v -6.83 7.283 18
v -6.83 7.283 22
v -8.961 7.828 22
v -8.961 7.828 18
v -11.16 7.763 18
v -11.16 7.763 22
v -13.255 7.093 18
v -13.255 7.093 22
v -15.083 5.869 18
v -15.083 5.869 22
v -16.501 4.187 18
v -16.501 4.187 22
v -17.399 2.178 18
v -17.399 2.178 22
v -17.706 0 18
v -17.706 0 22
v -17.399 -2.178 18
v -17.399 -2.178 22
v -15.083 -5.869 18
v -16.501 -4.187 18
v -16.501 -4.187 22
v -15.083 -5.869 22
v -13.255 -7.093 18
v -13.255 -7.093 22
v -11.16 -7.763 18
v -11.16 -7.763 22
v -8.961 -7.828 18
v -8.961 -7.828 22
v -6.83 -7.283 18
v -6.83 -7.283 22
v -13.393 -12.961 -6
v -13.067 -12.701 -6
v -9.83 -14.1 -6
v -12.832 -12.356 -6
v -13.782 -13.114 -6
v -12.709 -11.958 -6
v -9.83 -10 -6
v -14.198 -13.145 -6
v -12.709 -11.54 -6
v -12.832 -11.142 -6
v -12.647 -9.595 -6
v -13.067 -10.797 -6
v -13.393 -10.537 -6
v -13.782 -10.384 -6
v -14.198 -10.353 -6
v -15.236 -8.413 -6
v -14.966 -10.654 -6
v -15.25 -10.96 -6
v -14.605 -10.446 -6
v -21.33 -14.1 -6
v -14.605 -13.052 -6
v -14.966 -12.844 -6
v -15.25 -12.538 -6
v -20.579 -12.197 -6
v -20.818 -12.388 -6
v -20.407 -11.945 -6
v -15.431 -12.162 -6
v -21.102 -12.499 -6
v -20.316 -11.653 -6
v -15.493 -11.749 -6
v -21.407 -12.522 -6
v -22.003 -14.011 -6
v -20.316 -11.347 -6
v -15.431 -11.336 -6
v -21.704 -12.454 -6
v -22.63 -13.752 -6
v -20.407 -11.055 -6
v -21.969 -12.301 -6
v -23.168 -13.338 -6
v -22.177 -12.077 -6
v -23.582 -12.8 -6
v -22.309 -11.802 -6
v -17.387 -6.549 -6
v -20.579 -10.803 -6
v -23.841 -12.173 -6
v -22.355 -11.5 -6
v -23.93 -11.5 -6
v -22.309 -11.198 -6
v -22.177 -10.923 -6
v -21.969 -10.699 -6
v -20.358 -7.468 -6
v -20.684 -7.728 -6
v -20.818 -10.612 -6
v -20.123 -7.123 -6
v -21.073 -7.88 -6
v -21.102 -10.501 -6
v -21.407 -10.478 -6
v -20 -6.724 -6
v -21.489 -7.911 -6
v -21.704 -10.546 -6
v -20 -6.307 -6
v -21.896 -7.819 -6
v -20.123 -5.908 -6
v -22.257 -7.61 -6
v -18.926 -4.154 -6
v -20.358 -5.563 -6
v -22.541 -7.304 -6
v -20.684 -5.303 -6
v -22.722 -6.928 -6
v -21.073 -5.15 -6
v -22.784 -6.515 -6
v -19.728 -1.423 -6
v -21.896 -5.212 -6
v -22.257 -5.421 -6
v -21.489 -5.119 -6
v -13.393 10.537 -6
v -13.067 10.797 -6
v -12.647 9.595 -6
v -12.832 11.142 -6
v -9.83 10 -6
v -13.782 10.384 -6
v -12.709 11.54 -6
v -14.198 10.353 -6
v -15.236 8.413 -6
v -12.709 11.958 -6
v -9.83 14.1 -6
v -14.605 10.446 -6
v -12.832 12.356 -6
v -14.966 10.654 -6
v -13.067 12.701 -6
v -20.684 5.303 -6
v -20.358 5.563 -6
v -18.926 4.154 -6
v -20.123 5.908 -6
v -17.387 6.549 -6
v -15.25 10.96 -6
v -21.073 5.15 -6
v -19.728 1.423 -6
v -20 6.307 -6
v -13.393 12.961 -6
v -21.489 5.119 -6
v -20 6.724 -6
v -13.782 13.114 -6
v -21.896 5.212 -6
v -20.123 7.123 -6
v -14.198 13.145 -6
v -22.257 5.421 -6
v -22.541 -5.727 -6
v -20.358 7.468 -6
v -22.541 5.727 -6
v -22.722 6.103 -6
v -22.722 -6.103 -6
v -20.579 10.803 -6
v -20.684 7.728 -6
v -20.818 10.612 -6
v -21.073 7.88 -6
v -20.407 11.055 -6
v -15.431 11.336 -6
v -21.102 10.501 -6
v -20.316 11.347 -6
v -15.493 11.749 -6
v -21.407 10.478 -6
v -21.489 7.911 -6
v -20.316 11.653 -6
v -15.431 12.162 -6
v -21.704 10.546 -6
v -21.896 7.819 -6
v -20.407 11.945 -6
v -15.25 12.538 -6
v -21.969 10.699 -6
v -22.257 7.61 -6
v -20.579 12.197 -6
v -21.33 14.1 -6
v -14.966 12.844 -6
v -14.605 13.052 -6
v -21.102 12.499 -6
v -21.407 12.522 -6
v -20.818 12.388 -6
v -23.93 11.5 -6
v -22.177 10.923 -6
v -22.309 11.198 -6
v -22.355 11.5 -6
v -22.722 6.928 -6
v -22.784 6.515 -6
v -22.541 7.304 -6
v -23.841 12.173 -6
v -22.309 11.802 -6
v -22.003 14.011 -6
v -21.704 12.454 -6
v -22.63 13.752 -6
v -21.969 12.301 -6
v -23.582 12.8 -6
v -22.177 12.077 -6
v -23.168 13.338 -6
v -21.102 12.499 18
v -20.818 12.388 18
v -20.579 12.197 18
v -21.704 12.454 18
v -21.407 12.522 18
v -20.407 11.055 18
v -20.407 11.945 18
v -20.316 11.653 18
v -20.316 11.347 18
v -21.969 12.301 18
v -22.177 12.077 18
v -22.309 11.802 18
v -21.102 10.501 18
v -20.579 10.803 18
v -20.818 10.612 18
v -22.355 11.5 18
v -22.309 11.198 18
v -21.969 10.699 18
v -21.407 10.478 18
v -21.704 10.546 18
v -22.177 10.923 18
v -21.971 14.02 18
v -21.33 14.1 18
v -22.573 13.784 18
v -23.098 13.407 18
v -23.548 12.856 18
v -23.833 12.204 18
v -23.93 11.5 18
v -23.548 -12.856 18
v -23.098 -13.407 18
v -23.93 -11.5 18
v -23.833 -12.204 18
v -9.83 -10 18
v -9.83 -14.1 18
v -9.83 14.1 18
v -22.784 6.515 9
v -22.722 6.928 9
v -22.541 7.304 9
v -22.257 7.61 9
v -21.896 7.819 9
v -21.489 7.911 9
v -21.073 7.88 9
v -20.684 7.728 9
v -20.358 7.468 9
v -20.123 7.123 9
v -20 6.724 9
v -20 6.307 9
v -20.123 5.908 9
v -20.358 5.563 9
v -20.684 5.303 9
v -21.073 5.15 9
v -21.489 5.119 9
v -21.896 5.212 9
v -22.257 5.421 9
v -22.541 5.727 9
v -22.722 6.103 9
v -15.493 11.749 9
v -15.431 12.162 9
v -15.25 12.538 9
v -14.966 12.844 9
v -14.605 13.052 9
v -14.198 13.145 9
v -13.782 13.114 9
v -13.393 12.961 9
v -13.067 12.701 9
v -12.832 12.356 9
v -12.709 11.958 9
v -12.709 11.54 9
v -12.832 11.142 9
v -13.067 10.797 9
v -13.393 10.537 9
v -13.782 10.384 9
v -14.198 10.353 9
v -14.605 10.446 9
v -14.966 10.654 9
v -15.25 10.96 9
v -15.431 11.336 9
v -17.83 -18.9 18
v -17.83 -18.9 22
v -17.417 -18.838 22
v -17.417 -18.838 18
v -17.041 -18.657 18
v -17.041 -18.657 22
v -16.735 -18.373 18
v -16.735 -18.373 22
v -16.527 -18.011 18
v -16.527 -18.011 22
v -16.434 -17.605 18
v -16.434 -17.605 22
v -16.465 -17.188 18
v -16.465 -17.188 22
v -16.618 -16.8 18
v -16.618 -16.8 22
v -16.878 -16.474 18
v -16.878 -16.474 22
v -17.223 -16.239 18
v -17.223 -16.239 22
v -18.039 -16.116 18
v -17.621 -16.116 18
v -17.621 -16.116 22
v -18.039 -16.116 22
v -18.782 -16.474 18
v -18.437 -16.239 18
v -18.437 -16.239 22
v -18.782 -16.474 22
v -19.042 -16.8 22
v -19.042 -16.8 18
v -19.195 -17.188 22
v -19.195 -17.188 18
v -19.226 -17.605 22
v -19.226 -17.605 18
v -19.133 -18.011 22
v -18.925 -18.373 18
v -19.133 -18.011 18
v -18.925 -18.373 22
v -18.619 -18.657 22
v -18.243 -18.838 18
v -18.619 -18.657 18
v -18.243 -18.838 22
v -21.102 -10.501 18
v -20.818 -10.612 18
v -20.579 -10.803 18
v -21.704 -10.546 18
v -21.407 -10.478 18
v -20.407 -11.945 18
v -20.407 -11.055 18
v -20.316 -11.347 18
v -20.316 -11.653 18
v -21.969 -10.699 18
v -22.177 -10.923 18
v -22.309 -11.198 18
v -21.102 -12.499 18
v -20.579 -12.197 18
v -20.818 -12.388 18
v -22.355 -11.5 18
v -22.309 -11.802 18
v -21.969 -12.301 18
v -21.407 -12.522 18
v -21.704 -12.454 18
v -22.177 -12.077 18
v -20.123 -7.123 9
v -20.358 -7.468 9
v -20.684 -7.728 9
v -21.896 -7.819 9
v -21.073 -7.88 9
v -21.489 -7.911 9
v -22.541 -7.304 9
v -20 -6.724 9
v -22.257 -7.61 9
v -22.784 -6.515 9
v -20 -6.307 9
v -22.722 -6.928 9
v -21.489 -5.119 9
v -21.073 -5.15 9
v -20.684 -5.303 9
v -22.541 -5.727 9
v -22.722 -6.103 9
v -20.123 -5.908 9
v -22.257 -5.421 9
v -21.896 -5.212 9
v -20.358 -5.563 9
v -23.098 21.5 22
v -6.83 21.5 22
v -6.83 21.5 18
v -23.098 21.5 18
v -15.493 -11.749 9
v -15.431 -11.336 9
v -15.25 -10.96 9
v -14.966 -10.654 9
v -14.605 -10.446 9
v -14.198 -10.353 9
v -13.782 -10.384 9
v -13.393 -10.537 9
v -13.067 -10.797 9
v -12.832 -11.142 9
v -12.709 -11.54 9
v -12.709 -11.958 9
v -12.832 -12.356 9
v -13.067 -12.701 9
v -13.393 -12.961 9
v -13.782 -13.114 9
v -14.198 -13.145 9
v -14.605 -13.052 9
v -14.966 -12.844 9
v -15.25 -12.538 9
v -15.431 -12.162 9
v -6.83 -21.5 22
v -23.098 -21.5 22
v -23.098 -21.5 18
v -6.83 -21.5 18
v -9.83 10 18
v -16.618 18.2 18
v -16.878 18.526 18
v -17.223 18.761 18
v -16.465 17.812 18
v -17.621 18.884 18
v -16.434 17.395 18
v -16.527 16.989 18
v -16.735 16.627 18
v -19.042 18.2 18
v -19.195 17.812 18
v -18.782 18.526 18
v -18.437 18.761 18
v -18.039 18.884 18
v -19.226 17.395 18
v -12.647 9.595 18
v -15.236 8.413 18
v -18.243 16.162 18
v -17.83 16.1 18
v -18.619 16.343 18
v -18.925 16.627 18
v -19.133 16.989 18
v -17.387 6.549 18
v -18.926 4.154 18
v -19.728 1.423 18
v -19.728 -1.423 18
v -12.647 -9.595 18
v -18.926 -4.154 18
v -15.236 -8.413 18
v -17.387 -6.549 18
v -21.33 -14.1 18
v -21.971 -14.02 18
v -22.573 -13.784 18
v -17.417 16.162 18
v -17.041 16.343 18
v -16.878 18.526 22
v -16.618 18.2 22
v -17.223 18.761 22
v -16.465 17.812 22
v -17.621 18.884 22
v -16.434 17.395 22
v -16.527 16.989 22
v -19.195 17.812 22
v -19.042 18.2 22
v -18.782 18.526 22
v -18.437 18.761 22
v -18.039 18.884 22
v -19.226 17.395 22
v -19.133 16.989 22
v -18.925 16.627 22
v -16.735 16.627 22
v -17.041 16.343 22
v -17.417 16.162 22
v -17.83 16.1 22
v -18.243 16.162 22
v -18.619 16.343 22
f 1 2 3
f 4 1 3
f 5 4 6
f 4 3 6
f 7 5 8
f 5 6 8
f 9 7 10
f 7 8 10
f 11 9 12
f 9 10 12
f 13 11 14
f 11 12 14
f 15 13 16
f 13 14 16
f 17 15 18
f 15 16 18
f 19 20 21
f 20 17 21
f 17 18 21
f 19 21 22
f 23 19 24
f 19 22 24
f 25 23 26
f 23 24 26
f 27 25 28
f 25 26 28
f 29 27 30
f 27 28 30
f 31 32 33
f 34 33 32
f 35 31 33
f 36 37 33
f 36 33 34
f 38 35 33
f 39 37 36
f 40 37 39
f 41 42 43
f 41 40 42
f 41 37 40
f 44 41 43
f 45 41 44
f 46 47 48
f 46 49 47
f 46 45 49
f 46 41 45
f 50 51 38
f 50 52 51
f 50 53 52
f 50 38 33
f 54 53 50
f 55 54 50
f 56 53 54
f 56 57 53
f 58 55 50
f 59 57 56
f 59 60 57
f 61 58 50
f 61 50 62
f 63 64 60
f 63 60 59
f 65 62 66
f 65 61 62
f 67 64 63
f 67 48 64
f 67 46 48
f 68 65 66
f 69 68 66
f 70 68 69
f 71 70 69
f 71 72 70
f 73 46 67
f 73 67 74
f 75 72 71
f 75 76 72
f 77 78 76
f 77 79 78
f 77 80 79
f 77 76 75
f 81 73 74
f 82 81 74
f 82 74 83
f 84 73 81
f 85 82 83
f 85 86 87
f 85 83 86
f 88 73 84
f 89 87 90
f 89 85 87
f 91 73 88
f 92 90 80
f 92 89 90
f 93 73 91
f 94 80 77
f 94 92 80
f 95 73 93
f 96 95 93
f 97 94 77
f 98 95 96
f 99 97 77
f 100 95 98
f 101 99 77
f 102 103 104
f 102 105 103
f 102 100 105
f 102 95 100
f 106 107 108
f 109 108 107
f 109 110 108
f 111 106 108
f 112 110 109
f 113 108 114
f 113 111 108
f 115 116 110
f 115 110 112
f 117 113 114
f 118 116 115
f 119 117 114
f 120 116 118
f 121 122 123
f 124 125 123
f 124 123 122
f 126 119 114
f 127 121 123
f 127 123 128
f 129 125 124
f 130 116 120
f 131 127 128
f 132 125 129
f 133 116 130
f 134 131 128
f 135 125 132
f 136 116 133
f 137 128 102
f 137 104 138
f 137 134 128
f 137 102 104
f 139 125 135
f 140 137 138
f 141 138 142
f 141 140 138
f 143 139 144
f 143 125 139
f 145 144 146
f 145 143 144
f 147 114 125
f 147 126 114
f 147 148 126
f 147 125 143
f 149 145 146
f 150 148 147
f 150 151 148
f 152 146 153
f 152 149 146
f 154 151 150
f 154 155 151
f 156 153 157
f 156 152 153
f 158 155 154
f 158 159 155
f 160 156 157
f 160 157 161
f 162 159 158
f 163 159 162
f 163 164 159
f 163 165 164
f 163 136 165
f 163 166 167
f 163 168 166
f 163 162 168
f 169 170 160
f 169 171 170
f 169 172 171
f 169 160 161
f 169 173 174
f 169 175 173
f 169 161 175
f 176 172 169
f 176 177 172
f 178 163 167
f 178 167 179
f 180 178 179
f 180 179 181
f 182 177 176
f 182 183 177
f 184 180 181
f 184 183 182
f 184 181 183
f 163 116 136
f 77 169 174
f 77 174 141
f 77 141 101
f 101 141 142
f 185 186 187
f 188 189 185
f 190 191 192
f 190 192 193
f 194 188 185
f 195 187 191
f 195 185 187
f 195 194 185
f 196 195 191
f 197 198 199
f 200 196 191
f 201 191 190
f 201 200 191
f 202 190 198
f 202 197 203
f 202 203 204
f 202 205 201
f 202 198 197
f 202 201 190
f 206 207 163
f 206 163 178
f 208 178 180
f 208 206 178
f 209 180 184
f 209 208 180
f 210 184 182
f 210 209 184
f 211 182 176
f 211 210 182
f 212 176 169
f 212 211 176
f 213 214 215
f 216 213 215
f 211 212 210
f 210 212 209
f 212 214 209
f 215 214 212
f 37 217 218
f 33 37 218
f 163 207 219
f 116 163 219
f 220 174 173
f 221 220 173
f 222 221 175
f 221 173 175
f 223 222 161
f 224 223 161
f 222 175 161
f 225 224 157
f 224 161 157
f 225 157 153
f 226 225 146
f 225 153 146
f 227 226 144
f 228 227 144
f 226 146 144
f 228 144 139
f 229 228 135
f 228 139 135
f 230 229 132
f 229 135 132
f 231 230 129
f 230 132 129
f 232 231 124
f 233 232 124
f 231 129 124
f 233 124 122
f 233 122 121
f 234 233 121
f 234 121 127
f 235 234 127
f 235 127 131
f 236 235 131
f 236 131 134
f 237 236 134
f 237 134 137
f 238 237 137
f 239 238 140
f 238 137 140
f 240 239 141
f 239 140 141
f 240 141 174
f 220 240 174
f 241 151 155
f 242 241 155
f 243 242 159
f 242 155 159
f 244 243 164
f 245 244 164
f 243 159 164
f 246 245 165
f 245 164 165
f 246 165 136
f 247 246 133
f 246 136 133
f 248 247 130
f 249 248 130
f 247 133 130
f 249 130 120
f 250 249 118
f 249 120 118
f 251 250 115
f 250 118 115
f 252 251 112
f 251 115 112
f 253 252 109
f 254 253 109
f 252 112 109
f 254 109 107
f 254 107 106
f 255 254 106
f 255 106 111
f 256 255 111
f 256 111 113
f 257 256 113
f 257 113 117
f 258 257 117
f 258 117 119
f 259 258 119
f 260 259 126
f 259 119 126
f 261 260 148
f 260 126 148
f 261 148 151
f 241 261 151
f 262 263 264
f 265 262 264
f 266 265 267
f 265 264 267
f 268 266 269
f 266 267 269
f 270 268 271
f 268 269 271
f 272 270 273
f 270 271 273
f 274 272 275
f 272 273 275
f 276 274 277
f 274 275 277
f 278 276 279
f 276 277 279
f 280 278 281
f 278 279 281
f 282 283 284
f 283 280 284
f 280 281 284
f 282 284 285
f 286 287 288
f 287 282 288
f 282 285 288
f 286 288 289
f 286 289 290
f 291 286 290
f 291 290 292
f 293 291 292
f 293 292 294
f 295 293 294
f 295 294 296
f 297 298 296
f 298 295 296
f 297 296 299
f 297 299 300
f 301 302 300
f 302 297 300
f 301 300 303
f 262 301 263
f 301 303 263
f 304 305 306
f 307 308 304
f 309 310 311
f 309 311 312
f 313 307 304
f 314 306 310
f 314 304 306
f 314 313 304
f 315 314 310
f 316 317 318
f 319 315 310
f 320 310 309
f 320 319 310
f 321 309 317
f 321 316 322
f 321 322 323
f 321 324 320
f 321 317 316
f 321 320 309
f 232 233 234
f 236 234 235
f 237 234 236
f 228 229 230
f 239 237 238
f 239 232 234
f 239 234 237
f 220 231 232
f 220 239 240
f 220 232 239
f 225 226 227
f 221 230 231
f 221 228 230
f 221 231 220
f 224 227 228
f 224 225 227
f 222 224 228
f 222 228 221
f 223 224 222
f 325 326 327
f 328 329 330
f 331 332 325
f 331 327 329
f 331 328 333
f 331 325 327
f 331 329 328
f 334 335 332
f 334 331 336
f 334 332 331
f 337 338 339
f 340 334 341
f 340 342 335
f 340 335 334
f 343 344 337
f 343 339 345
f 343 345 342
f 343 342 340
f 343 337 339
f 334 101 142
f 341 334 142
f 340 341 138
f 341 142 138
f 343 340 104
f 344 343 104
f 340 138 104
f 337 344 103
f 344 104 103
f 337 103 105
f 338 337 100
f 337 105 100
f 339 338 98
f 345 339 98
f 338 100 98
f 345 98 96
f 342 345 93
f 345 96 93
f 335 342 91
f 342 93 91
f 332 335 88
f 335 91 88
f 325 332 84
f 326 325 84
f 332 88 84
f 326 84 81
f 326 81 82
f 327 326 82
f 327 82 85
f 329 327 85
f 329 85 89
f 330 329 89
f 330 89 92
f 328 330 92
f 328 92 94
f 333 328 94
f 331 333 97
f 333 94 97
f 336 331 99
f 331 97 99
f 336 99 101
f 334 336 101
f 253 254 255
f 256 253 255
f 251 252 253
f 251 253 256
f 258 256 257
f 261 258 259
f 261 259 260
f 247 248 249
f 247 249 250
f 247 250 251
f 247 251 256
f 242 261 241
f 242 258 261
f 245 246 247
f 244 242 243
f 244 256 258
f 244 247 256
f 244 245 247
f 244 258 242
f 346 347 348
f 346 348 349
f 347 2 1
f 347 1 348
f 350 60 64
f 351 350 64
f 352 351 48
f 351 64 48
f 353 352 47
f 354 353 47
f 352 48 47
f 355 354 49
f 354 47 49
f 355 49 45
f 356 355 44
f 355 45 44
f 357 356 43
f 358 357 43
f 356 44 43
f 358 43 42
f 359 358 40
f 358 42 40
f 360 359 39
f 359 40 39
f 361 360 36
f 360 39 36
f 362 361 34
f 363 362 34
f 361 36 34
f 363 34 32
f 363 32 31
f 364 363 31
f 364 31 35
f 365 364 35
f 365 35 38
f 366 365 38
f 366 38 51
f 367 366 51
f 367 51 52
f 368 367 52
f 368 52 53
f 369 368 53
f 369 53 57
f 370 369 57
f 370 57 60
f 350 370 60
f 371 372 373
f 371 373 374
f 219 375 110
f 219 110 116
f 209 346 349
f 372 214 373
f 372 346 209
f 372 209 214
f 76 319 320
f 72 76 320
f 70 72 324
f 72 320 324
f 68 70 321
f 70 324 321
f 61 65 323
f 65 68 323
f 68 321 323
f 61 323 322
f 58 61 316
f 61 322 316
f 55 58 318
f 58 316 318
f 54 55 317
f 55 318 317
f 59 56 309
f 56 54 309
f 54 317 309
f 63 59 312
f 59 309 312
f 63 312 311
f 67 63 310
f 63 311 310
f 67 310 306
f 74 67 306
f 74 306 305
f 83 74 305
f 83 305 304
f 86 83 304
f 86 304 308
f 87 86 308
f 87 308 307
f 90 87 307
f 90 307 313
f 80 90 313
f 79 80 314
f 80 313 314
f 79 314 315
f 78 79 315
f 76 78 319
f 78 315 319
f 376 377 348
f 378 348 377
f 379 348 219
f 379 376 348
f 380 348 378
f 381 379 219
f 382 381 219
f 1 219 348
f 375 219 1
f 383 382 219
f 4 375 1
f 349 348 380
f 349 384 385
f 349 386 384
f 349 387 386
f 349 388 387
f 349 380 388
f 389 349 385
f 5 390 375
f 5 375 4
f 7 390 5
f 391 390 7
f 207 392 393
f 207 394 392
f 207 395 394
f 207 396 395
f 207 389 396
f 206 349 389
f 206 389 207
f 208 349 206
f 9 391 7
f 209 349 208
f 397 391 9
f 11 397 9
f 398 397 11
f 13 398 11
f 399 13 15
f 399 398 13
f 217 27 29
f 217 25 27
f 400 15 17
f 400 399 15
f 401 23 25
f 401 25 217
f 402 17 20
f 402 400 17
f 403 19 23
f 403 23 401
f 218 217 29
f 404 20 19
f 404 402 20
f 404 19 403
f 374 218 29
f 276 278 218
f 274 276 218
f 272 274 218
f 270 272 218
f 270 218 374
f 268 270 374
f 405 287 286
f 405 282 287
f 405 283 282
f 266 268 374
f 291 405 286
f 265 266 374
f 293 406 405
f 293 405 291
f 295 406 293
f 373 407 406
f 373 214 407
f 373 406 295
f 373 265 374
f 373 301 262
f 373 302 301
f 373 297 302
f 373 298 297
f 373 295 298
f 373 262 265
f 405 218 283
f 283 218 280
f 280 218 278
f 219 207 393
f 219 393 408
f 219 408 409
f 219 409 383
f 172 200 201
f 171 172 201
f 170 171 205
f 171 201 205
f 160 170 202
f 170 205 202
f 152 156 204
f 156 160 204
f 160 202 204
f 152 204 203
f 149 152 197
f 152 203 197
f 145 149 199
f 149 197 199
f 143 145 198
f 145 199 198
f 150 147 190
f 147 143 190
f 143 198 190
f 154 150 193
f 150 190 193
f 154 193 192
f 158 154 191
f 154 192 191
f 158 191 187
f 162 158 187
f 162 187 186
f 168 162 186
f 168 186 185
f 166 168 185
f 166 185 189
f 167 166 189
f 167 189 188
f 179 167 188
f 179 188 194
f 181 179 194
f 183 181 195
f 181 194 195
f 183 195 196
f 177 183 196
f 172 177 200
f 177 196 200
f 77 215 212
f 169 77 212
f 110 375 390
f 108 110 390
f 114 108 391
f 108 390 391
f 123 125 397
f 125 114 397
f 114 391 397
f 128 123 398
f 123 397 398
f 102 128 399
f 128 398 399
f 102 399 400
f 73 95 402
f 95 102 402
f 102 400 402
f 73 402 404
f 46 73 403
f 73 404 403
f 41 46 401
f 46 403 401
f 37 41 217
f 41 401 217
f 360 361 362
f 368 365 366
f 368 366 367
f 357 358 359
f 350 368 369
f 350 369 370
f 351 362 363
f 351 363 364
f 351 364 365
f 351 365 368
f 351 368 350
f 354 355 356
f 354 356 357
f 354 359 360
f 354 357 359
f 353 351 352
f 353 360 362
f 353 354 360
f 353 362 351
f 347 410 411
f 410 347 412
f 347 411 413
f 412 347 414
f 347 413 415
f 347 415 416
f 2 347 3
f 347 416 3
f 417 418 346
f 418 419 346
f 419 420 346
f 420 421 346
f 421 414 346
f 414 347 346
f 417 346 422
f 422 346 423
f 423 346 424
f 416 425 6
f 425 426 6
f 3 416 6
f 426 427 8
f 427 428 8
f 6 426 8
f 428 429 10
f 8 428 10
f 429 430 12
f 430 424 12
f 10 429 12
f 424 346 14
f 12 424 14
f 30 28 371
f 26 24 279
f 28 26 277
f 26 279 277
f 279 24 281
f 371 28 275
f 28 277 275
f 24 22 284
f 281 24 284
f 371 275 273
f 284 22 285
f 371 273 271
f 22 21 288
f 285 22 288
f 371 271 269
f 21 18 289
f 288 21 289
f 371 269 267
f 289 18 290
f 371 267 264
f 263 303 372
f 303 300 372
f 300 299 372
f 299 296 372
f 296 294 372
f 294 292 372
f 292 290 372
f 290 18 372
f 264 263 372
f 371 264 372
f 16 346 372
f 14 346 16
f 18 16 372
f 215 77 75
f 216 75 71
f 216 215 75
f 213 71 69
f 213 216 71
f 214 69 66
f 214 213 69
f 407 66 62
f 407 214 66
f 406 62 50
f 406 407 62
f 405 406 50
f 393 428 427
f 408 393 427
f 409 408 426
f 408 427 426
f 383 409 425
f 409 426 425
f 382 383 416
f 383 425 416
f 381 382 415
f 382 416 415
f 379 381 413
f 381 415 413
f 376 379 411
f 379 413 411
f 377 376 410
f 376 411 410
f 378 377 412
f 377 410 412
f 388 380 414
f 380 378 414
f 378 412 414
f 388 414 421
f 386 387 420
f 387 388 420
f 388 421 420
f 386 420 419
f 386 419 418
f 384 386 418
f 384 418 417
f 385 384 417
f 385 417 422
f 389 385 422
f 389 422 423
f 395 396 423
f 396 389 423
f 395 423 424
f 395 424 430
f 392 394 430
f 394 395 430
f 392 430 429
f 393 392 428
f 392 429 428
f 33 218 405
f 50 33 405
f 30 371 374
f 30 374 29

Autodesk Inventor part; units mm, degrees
ref_plane "YZ Plane" through (0, 0, 0) normal (1, 0, 0) x (0, 1, 0)
ref_plane "XZ Plane" through (0, 0, 0) normal (0, 1, 0) x (-1, 0, 0)
ref_plane "Work Plane3" through (-9.83, 0, 22) normal (0, 0, -1) x (0, -1, 0)
sketch "Sketch2" plane through (-9.83, 0, 22) normal (0, 0, -1) x (0, -1, 0)
  arc A0 (-15.4, 8) -> (-19.6, 8) centre (-17.5, 8) ccw projected
  circle A1 centre (17.5, 8) radius 2.1 projected
  circle A2 centre (-17.5, 8) radius 1.4
  circle A3 centre (17.5, 8) radius 1.4
  arc A4 (-11.5, 14) -> (-14, 11.5) centre (-11.5, 11.5) ccw construction
  arc A5 (14, 11.5) -> (11.5, 14) centre (11.5, 11.5) ccw construction
  line L0 (-21.5, 13.2678) -> (21.5, 13.2678)
  line L1 (21.5, 13.2678) -> (21.5, -3)
  line L2 (-21.5, -3) -> (-21.5, 13.2678)
  arc A6 (-2.1271, -1.5804) -> (-2.4402, 1.0334) centre (0, 0) ccw projected
  arc A7 (7.2826, -3) -> (-7.2826, -3) centre (0, 0) ccw
  line L3 (21.5, -3) -> (7.2826, -3)
  line L4 (-7.2826, -3) -> (-21.5, -3)
  dimension "d26" = 2.8
  dimension "d27" = 2.8
  dimension "d28" = 4
  dimension "d29" = 4
extrude "Extrusion2" add sketch "Sketch2" along normal blind 4 contours A1 | L0 L1 L3 A7 L4 L2
sketch "Sketch3" plane through (-9.83, 0, 18) normal (0, 0, -1) x (-1, 0, 0)
  circle A0 centre (0, 0) radius 12.75 projected
  circle A1 centre (11.5, 11.5) radius 1.025 projected
  circle A2 centre (11.5, -11.5) radius 1.025 projected
  circle A3 centre (-11.5, -11.5) radius 1.025 projected
  circle A4 centre (-11.5, 11.5) radius 1.025 projected
  line L0 (-11.5, -14.1) -> (11.5, -14.1) projected
  arc A5 (11.5, -14.1) -> (14.1, -11.5) centre (11.5, -11.5) ccw projected
  line L1 (14.1, -11.5) -> (14.1, 11.5) projected
  arc A6 (14.1, 11.5) -> (11.5, 14.1) centre (11.5, 11.5) ccw projected
  line L2 (11.5, 14.1) -> (-11.5, 14.1) projected
  arc A7 (-11.5, 14.1) -> (-14.1, 11.5) centre (-11.5, 11.5) ccw projected
  line L3 (-14.1, 11.5) -> (-14.1, -11.5) projected
  arc A8 (-14.1, -11.5) -> (-11.5, -14.1) centre (-11.5, -11.5) ccw projected
  line L4 (-11.5, -14.1) -> (11.5, -14.1) projected
  line L5 (0, -14.1) -> (0, -12.75)
  line L6 (0, 12.75) -> (0, 14.1)
  line L7 (11.5, 14.1) -> (-11.5, 14.1) projected
  circle A9 centre (0, 0) radius 10
  line L8 (0, -10) -> (0, -12.75)
  line L9 (0, 10) -> (0, 12.75)
  point P0 (-9.83, 0)
  dimension "d11" = 20
ref_plane "Work Plane4" through (-37.83, -24.85, 0) normal (0, 0, -1) x (0, 1, 0)
extrude "Extrusion3" add sketch "Sketch3" along normal blind 24 contours A0 L8 A9 L9 | A0 L6 L2 A6 L1 A5 L0 L5 picked at (11.7268, -0.9457)
sketch "Sketch4" plane through (-9.83, -14.1, -6) normal (0, 0, -1) x (-1, 0, 0)
  circle A0 centre (4.2632, 2.351) radius 1.4
  circle A1 centre (11.5541, 7.5847) radius 1.4
  arc A2 (0, 4.1) -> (0, 24.1) centre (0, 14.1) ccw projected
  line L0 (10, 14.1) -> (14.0989, 14.1)
  circle A3 centre (4.2632, 25.849) radius 1.4
  circle A4 centre (11.5541, 20.6153) radius 1.4
  point P0 (-9.83, 14.1)
  dimension "d16" = 2.8
  dimension "d17" = 2.8
extrude "Extrusion4" cut sketch "Sketch4" against normal blind 15
properties part number "30_Cube_Z_Focus_MGN_NEMA_Motoradapter_NEMA11_v3"
